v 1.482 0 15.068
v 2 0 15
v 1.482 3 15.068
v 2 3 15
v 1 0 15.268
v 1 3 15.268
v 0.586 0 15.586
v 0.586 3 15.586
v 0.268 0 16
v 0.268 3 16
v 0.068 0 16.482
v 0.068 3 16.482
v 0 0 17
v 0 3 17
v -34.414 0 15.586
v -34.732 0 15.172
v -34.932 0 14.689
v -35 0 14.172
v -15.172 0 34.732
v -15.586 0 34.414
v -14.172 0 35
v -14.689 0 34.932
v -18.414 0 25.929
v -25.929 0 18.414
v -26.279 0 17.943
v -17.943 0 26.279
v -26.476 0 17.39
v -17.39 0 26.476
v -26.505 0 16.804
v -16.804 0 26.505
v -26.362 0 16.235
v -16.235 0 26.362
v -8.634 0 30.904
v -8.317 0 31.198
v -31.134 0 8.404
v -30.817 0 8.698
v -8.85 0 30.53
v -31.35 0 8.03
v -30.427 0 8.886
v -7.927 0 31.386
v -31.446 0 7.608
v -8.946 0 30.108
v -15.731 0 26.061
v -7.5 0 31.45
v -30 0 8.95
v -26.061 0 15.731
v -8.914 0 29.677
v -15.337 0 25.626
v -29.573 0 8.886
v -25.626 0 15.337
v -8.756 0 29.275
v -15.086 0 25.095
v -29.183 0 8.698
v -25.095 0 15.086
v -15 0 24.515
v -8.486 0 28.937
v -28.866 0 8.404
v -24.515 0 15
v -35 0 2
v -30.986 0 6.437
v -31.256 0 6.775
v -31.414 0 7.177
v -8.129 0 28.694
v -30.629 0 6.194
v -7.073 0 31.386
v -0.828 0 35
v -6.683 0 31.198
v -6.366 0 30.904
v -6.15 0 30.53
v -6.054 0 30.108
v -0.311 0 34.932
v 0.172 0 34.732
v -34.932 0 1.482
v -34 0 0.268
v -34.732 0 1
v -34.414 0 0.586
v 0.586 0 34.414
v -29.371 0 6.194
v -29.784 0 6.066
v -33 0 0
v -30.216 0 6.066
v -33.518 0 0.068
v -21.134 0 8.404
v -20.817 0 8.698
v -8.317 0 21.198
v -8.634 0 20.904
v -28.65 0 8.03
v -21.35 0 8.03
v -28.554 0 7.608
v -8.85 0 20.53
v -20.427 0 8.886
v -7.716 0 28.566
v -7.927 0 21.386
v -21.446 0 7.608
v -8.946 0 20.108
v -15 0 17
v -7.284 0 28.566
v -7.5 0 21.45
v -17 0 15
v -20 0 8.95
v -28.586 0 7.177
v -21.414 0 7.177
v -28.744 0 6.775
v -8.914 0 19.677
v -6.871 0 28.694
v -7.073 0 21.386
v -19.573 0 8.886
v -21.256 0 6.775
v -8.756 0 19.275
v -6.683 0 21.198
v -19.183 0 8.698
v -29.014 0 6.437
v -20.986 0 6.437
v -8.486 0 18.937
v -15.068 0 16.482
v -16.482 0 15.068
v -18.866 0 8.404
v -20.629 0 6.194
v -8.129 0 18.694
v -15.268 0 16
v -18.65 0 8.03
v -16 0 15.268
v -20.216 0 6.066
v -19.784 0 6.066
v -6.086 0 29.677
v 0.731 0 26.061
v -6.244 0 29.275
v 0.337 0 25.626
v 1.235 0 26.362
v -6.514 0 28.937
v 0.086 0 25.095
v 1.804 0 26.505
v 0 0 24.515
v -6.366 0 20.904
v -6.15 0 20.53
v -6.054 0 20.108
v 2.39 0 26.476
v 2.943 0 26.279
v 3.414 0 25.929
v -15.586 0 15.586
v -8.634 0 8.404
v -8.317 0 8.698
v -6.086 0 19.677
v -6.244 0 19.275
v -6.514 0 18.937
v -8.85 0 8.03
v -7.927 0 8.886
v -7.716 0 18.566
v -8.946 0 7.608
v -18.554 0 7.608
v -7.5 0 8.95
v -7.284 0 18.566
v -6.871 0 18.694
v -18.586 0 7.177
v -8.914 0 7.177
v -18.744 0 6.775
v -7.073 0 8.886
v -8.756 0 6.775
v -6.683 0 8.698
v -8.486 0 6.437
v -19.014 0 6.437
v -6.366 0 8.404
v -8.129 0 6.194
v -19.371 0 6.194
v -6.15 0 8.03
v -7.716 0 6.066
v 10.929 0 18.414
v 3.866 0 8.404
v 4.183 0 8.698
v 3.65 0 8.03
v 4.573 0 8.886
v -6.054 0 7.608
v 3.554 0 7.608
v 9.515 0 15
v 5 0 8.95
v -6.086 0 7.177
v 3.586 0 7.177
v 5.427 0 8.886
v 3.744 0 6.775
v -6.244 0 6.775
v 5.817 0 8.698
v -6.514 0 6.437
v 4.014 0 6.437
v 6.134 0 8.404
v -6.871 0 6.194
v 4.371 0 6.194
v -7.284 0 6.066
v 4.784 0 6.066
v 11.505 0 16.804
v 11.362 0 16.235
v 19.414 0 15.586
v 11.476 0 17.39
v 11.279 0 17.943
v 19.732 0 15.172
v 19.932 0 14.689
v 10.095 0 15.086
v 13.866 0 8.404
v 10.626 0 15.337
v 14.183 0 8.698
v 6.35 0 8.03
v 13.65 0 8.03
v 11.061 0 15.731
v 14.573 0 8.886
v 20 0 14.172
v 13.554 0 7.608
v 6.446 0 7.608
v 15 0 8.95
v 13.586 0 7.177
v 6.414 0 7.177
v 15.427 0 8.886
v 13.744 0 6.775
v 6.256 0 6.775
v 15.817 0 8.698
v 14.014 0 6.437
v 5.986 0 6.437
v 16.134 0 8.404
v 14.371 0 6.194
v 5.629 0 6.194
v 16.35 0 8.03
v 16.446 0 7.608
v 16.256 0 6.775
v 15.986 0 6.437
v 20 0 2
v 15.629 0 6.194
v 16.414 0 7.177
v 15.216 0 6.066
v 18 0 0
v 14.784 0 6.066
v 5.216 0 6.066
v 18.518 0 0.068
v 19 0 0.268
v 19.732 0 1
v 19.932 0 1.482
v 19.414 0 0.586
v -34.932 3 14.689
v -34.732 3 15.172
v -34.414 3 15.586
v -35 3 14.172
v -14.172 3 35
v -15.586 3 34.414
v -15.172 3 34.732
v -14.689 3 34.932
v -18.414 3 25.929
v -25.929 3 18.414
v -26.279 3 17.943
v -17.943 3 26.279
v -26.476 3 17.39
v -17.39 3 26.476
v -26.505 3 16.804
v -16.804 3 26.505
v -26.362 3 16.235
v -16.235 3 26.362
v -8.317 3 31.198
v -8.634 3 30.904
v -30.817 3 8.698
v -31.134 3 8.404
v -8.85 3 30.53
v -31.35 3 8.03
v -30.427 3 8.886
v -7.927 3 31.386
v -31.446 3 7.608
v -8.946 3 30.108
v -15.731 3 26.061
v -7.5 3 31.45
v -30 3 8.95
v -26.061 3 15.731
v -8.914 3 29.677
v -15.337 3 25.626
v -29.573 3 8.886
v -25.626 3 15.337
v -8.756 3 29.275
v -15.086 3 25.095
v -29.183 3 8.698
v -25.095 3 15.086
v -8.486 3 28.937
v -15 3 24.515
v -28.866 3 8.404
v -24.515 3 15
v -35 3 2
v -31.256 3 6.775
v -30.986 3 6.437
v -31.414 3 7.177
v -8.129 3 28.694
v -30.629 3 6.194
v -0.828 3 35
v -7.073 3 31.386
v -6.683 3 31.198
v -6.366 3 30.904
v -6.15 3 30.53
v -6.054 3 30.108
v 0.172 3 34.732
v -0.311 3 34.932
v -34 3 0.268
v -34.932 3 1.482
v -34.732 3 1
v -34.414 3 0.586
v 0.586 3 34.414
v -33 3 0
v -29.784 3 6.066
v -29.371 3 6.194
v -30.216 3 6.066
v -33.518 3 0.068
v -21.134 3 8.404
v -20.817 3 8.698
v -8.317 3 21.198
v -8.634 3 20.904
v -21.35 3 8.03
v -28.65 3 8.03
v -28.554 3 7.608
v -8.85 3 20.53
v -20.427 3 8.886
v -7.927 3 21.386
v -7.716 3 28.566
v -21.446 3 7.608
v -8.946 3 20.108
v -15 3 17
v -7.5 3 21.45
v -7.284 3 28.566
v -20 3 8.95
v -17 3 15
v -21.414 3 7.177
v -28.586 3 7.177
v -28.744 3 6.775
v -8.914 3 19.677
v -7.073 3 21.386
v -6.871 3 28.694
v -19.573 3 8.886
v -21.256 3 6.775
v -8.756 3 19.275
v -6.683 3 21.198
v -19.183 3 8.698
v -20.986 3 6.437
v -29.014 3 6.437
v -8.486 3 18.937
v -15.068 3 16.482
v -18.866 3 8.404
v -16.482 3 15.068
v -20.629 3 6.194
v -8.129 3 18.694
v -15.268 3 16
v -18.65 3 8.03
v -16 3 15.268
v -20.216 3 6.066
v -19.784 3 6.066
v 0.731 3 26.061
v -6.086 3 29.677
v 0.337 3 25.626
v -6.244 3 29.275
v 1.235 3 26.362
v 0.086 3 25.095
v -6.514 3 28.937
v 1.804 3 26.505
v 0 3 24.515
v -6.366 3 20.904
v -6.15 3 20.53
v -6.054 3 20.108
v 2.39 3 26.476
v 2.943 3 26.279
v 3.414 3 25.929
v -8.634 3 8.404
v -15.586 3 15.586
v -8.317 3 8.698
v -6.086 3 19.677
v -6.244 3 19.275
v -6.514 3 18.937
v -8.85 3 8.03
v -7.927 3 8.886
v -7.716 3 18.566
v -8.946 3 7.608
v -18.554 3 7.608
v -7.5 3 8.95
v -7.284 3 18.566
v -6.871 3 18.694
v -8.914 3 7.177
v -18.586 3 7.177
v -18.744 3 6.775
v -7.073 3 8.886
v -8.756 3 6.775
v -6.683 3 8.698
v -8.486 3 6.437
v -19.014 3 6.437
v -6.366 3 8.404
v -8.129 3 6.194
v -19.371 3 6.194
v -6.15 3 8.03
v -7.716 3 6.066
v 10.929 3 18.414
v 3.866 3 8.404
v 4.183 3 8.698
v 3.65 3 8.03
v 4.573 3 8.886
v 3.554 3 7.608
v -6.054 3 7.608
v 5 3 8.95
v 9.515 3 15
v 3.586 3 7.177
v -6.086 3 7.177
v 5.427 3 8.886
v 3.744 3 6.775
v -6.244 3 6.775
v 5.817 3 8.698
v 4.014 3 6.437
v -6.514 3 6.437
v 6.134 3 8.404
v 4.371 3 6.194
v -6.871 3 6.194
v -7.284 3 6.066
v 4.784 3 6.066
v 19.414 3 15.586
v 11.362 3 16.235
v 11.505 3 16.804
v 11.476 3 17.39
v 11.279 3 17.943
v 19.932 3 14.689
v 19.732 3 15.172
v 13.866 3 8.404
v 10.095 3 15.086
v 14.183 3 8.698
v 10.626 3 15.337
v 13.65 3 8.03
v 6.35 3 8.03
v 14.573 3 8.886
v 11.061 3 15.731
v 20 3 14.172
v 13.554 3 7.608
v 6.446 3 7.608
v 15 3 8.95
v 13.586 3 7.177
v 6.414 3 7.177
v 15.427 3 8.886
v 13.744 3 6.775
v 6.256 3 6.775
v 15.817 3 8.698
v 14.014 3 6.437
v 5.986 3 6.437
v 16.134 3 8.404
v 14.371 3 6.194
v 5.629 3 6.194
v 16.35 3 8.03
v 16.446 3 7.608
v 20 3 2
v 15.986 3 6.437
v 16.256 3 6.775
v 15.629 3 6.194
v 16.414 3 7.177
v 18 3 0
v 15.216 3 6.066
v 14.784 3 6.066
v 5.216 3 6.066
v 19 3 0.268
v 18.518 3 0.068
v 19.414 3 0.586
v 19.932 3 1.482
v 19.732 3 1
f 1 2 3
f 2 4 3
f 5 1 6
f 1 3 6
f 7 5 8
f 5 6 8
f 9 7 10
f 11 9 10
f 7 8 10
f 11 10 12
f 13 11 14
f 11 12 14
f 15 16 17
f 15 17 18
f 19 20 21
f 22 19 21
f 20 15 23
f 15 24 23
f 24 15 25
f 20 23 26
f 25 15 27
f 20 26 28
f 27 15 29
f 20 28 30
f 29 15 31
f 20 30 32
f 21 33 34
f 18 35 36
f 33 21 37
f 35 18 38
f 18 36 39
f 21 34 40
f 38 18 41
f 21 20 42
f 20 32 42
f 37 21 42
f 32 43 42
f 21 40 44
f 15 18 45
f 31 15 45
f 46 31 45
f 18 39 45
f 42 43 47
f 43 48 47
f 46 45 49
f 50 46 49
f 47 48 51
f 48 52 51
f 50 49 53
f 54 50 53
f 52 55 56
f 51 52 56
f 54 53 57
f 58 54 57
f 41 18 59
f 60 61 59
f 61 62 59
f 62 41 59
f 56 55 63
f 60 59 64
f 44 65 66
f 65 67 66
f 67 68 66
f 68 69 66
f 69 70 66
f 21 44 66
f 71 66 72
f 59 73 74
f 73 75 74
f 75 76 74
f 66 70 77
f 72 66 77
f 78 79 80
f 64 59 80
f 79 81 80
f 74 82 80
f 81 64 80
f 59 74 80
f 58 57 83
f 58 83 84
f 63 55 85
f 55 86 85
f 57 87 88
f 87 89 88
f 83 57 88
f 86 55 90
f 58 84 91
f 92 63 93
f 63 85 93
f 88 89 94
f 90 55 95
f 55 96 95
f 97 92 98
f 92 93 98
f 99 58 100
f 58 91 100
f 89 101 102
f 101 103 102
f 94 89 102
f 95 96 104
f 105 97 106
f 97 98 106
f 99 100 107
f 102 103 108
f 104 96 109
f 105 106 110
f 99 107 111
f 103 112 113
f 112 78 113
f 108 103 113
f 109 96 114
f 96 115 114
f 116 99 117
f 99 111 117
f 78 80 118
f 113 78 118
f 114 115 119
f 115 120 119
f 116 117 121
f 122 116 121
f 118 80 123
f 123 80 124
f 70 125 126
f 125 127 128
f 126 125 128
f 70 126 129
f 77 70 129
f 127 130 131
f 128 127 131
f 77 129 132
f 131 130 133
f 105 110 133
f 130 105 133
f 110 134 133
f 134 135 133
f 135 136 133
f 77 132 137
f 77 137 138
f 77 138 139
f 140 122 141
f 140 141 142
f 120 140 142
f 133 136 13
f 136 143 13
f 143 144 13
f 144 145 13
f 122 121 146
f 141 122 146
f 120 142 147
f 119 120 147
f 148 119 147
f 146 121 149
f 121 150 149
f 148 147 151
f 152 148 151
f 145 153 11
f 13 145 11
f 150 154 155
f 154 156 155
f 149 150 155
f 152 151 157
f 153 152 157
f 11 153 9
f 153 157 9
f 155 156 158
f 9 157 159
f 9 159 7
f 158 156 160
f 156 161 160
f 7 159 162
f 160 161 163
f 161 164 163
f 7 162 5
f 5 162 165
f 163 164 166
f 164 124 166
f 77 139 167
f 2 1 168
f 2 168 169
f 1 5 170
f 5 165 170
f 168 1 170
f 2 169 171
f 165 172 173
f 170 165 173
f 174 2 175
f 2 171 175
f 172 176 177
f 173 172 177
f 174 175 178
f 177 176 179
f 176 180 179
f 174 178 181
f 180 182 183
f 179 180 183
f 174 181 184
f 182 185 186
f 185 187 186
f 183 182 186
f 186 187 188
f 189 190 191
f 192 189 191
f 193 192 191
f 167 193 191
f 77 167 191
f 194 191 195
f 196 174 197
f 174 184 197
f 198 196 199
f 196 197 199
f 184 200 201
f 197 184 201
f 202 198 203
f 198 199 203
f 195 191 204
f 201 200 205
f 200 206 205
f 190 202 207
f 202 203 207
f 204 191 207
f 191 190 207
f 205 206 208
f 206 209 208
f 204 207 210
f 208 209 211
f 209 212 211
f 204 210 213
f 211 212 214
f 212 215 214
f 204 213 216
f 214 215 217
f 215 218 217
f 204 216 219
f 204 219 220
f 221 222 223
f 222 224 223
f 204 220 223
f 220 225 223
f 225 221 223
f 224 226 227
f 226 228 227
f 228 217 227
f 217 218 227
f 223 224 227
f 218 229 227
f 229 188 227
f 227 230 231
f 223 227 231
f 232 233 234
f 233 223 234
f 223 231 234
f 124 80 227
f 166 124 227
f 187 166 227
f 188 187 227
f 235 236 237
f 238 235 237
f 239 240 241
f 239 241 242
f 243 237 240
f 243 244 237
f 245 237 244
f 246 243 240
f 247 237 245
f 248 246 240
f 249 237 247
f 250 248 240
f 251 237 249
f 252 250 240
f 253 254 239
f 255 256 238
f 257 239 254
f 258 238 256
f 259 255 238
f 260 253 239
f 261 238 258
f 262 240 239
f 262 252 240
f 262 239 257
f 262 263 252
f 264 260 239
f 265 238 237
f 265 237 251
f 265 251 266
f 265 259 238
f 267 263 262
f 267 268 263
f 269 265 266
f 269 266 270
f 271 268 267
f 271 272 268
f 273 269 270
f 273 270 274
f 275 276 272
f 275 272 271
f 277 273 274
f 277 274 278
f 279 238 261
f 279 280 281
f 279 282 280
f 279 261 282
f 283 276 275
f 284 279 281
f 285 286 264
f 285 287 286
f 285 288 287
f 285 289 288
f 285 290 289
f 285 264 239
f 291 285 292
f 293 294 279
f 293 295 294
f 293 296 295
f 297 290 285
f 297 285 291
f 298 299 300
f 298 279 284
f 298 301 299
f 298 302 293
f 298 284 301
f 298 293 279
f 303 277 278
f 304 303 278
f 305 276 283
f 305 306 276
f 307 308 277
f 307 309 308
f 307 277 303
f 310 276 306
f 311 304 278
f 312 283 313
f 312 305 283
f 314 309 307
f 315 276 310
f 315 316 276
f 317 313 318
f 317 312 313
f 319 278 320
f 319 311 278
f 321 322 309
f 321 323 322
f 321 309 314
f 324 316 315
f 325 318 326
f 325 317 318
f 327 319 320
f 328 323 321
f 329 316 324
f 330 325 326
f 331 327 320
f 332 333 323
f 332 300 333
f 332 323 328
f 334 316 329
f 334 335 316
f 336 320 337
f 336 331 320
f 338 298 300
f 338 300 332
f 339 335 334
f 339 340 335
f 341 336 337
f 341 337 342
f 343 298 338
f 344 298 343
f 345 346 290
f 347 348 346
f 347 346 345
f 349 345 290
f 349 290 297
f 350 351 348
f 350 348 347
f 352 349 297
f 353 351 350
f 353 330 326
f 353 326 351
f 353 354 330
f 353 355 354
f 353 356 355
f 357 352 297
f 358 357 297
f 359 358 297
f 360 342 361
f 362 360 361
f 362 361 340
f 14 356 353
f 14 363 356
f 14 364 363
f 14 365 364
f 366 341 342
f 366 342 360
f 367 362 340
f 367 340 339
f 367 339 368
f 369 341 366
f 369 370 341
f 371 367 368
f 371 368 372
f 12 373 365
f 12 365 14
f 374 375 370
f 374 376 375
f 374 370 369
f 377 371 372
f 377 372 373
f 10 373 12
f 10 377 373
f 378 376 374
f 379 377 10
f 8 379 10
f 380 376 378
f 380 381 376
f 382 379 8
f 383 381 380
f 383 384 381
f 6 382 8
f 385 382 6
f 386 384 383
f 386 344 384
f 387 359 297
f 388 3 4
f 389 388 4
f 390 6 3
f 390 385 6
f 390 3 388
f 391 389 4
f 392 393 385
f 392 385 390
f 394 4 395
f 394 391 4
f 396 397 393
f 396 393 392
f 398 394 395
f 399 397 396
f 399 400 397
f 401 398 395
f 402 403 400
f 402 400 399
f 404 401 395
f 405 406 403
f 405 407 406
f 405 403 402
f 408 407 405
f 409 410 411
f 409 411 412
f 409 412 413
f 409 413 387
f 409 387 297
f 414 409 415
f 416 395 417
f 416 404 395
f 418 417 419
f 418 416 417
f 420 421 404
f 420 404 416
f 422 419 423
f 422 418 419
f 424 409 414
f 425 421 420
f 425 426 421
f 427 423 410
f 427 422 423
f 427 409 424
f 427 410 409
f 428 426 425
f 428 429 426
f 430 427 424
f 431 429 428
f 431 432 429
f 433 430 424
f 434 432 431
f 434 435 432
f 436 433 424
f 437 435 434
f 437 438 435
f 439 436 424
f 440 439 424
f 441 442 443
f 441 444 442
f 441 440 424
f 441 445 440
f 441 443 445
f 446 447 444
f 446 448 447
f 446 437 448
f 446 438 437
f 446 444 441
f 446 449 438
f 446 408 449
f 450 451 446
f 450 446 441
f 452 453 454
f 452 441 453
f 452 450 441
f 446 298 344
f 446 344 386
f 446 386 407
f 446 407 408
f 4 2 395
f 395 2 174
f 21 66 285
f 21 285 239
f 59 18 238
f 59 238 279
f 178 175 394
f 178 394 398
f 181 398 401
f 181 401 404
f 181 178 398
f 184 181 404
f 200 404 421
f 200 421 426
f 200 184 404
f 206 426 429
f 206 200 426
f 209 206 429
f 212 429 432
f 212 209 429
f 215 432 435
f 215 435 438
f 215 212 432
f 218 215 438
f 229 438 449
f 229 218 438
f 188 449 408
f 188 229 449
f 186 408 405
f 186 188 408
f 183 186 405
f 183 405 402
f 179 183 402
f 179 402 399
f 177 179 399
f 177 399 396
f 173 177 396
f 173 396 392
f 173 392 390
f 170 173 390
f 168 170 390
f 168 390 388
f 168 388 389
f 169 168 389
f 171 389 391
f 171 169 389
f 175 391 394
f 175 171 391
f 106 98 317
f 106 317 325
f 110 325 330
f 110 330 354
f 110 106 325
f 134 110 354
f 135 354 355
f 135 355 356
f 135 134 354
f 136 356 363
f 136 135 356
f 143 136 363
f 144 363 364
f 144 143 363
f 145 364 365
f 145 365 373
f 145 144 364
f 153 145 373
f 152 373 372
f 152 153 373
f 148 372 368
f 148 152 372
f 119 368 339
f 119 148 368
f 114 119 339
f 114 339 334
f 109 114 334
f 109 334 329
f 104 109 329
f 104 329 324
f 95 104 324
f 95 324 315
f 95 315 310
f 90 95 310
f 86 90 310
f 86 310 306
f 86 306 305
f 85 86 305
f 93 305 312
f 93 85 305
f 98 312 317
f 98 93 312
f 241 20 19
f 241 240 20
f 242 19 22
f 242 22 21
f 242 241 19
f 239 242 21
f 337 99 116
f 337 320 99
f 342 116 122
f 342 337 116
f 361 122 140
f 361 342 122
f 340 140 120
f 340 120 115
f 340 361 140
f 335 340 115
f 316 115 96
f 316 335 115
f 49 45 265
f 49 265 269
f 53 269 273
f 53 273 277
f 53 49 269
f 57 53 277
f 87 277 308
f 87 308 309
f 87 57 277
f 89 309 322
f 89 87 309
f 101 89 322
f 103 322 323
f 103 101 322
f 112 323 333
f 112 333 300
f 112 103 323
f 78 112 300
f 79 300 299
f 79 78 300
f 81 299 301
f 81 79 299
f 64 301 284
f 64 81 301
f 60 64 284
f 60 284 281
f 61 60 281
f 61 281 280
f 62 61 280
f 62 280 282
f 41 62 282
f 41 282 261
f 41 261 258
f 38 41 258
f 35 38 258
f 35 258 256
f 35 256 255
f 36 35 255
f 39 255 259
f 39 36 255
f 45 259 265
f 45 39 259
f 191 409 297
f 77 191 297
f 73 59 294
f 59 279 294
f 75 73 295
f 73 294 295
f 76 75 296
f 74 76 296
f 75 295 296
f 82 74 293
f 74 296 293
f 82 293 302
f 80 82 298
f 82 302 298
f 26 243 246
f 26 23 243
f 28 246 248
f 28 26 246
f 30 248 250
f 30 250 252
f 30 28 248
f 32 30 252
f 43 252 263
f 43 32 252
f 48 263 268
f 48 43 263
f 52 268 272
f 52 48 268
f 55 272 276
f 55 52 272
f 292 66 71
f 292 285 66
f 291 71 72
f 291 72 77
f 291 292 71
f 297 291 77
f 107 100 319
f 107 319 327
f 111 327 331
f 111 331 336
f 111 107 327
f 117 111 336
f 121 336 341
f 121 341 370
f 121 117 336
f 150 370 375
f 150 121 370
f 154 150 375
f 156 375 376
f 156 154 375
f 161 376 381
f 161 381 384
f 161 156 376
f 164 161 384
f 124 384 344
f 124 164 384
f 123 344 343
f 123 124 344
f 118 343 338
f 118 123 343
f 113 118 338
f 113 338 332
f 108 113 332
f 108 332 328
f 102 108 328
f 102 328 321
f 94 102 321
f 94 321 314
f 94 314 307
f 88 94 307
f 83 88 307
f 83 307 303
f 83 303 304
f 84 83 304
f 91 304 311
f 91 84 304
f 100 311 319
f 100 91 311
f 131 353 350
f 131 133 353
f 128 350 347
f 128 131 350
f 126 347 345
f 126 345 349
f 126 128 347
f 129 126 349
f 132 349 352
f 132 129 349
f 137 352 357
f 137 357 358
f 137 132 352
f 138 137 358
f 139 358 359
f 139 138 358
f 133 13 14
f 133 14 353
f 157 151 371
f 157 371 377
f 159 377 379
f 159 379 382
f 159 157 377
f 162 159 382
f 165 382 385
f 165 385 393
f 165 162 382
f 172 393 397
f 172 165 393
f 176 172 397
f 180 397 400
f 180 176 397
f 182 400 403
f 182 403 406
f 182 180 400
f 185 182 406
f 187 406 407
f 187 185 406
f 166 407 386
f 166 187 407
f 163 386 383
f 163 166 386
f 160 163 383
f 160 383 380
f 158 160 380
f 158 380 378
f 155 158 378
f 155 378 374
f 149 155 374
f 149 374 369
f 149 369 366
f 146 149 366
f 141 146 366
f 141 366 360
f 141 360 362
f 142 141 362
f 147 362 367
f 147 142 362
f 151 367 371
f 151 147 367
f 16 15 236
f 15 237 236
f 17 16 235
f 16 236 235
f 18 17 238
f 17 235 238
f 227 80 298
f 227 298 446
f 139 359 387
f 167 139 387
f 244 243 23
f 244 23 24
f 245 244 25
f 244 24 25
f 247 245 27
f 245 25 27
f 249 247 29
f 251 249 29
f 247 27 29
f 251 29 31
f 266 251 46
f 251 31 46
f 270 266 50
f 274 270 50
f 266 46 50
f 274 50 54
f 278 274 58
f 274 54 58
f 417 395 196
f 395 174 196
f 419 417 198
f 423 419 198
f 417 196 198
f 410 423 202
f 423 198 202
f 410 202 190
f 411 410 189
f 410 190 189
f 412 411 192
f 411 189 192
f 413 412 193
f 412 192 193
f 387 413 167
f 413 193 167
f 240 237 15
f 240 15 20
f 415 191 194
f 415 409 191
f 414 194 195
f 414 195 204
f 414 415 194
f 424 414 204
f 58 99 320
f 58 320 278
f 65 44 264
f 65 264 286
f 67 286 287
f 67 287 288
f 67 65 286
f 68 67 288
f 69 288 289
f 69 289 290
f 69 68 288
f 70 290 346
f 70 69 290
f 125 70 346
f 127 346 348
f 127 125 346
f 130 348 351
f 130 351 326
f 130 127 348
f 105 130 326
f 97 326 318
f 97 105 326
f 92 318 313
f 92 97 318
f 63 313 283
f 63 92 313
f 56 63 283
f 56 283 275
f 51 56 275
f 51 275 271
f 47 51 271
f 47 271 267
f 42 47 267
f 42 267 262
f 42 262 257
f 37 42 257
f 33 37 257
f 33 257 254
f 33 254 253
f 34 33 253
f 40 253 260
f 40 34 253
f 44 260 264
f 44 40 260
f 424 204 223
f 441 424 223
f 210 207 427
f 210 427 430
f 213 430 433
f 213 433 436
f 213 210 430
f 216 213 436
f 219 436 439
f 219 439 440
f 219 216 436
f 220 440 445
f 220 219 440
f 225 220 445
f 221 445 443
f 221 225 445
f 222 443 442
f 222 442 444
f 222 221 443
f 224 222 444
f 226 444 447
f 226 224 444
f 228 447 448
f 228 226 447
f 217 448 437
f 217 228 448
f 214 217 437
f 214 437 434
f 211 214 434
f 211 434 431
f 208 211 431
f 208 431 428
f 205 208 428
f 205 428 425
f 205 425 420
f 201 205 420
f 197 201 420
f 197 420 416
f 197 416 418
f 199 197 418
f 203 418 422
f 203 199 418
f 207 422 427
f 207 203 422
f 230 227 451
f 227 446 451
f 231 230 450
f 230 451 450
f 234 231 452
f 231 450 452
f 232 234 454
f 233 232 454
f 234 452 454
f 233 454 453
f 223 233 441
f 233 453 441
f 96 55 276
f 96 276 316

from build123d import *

# Parameters (mm, degrees)
SKETCH_1_R      = 1.45
SKETCH_1_W      = 20
SKETCH_1_H      = 15
EXTRUDE_1_DEPTH = 3
EXTRUDE_2_DEPTH = 3
FILLET_1_R      = 2


with BuildPart() as part:
    # 草图1 → 凸台-拉伸1 (new body)
    # profile 1 of 2: a face of its own
    with BuildSketch(Plane(origin=(0, 0, 0), x_dir=(1, 0, 0), z_dir=(0, 1, 0))):
        Polygon((-15, -35), (-15, -15), (-35, -15), (-35, 0), (0, 0), (0, -35), align=None)
        with Locations(Location((-7.5, -30, 0), (0, 0, 270))):
            Circle(SKETCH_1_R, mode=Mode.SUBTRACT)
        with Locations(Location((-7.5, -20, 0), (0, 0, 270))):
            Circle(SKETCH_1_R, mode=Mode.SUBTRACT)
        with Locations(Location((-30, -7.5, 0), (0, 0, 270))):
            Circle(SKETCH_1_R, mode=Mode.SUBTRACT)
        with Locations(Location((-20, -7.5, 0), (0, 0, 270))):
            Circle(SKETCH_1_R, mode=Mode.SUBTRACT)
        with Locations(Location((-7.5, -7.5, 0), (0, 0, 270))):
            Circle(SKETCH_1_R, mode=Mode.SUBTRACT)
    # profile 2 of 2: a face of its own
    with BuildSketch(Plane(origin=(0, 0, 0), x_dir=(1, 0, 0), z_dir=(0, 1, 0))):
        with Locations((10, -7.5)):
            Rectangle(SKETCH_1_W, SKETCH_1_H)
        with Locations(Location((5, -7.5, 0), (0, 0, 270))):
            Circle(SKETCH_1_R, mode=Mode.SUBTRACT)
        with Locations(Location((15, -7.5, 0), (0, 0, 270))):
            Circle(SKETCH_1_R, mode=Mode.SUBTRACT)
    extrude(amount=EXTRUDE_1_DEPTH)

    # 草图2 → 凸台-拉伸2 (add)
    with BuildSketch(Plane(origin=(0, 3, 0), x_dir=(1, 0, 0), z_dir=(0, 1, 0))):
        Polygon((-35, -15), (-15, -35), (-15, -29.343145751), (-29.343145751, -15), align=None)
        Polygon((14.343145751, -15), (20, -15), (0, -35), (0, -29.343145751), align=None)
    extrude(amount=-EXTRUDE_2_DEPTH)

    # 圆角1
    fillet_1_edges = [part.edges().sort_by_distance(p)[0] for p in [
        (-15, 1.5, 15),
        (-35, 1.5, 15),
        (-35, 1.5, 0),
        (20, 1.5, 0),
        (20, 1.5, 15),
        (0, 1.5, 15),
        (0, 1.5, 35),
        (-15, 1.5, 35),
        (0, 1.5, 29.343145751),
        (14.343145751, 1.5, 15),
        (-29.343145751, 1.5, 15),
        (-15, 1.5, 29.343145751),
    ]]
    fillet(fillet_1_edges, radius=FILLET_1_R)


solid = part.part
